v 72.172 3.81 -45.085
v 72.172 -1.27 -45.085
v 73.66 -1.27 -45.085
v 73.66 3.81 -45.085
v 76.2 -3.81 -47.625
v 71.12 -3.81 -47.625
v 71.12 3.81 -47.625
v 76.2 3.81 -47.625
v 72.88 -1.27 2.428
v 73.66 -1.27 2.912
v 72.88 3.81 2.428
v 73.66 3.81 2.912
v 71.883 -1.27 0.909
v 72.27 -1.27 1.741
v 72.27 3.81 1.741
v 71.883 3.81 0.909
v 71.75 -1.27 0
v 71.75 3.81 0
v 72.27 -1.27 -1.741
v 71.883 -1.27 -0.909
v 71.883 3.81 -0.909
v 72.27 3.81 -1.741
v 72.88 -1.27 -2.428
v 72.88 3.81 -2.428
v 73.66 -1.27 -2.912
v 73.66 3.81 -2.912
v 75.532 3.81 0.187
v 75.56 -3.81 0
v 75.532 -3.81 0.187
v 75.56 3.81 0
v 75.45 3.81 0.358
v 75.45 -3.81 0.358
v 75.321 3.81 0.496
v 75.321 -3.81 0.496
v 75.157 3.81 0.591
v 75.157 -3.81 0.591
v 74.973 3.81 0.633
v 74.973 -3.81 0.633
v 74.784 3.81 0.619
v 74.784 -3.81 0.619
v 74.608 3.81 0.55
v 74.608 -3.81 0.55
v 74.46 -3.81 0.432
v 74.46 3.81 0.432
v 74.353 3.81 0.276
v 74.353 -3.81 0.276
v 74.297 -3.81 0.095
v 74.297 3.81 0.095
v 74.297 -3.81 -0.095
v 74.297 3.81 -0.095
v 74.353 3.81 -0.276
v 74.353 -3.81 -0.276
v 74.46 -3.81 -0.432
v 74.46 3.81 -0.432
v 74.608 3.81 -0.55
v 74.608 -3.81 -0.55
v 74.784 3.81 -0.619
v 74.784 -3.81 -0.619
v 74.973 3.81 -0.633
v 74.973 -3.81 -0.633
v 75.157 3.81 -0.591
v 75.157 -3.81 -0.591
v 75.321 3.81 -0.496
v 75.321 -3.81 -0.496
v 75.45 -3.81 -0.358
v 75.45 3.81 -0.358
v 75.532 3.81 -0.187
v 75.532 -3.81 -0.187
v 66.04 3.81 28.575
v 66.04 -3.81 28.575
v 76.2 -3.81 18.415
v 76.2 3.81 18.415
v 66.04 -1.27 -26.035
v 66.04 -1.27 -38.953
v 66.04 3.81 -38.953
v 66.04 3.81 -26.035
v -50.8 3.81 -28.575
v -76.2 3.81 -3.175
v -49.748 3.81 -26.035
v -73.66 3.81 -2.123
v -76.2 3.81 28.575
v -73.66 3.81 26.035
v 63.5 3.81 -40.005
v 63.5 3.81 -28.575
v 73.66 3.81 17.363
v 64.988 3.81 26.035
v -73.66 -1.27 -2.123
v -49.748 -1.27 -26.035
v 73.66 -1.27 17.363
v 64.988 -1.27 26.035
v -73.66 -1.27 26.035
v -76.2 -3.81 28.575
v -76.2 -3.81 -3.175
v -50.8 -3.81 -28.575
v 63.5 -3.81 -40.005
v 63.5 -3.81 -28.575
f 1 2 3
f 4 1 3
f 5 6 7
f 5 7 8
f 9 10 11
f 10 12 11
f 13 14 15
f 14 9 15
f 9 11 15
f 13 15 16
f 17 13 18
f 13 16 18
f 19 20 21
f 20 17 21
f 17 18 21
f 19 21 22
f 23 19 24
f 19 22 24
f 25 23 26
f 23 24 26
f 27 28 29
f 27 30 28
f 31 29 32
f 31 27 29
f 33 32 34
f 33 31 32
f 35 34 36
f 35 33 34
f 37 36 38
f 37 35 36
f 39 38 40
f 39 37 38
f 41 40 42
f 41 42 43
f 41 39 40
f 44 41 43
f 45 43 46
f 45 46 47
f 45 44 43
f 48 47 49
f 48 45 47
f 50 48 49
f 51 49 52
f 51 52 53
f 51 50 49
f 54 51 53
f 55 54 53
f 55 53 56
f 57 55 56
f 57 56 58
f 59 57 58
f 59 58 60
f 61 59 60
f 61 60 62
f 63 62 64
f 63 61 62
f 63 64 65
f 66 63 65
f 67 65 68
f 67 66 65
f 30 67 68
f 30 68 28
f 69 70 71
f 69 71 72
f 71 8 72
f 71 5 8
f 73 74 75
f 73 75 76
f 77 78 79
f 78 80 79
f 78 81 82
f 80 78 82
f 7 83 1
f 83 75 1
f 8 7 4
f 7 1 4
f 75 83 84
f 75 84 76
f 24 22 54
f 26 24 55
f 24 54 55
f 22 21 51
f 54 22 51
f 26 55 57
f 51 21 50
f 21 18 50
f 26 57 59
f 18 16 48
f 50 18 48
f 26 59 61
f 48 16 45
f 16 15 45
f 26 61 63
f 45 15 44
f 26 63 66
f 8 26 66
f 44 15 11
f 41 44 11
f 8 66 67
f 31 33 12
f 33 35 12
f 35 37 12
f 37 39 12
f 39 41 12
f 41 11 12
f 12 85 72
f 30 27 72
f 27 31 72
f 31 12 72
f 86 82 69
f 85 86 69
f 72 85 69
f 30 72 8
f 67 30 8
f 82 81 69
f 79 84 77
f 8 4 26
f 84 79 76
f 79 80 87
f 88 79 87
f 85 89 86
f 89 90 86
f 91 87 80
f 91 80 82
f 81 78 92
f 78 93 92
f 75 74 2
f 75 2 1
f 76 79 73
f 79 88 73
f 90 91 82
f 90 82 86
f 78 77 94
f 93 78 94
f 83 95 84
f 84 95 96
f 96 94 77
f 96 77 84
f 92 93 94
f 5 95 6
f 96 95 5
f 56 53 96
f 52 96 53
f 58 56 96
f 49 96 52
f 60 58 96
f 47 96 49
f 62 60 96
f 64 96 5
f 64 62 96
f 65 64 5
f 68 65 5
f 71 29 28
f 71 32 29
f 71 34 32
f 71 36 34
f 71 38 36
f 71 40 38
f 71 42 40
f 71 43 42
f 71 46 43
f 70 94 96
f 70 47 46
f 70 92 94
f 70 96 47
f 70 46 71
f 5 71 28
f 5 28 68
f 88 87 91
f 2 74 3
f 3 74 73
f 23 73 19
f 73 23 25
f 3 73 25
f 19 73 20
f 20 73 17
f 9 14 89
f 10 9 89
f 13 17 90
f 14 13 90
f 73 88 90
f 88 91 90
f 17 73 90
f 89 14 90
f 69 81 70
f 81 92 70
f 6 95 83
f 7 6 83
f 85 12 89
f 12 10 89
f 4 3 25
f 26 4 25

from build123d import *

# Parameters (mm, degrees)
F0_W     = 152.4
F0_H     = 57.15
F0_R     = 0.635
F1_DEPTH = 3.81
F2_SIZE  = 25.4
F3_W     = 12.7
F3_H     = 19.05
F4_DEPTH = 7.62
F5_SIZE  = 7.62
F6_SIZE  = 10.16
F7_T     = -2.54


with BuildPart() as f1:
    # F0 (on Front) → F1 (new body, symmetric)
    with BuildSketch(Plane.XZ):
        Rectangle(F0_W, F0_H)
        with Locations((74.9251618981, 0)):
            Circle(F0_R, mode=Mode.SUBTRACT)
    extrude(amount=F1_DEPTH, both=True)

    # F2
    f2_edges = [f1.edges().sort_by_distance(p)[0] for p in [
        (-76.2, 0, -28.575),
    ]]
    chamfer(f2_edges, length=F2_SIZE)

    # F3 (on face) → F4 (join)
    with BuildSketch(Plane.XZ.offset(3.81)):
        with Locations((69.85, -38.1)):
            Rectangle(F3_W, F3_H)
    extrude(amount=-F4_DEPTH)

    # F5
    f5_edges = [f1.edges().sort_by_distance(p)[0] for p in [
        (63.5, 0, -47.625),
    ]]
    chamfer(f5_edges, length=F5_SIZE)

    # F6
    f6_edges = [f1.edges().sort_by_distance(p)[0] for p in [
        (76.2, 0, 28.575),
    ]]
    chamfer(f6_edges, length=F6_SIZE)

    # F7
    f7_openings = [f1.faces().sort_by_distance(p)[0] for p in [
        (3.858416, 3.81, -0.318506),
    ]]
    offset(amount=F7_T, openings=f7_openings, kind=Kind.INTERSECTION)


solid = f1.part
